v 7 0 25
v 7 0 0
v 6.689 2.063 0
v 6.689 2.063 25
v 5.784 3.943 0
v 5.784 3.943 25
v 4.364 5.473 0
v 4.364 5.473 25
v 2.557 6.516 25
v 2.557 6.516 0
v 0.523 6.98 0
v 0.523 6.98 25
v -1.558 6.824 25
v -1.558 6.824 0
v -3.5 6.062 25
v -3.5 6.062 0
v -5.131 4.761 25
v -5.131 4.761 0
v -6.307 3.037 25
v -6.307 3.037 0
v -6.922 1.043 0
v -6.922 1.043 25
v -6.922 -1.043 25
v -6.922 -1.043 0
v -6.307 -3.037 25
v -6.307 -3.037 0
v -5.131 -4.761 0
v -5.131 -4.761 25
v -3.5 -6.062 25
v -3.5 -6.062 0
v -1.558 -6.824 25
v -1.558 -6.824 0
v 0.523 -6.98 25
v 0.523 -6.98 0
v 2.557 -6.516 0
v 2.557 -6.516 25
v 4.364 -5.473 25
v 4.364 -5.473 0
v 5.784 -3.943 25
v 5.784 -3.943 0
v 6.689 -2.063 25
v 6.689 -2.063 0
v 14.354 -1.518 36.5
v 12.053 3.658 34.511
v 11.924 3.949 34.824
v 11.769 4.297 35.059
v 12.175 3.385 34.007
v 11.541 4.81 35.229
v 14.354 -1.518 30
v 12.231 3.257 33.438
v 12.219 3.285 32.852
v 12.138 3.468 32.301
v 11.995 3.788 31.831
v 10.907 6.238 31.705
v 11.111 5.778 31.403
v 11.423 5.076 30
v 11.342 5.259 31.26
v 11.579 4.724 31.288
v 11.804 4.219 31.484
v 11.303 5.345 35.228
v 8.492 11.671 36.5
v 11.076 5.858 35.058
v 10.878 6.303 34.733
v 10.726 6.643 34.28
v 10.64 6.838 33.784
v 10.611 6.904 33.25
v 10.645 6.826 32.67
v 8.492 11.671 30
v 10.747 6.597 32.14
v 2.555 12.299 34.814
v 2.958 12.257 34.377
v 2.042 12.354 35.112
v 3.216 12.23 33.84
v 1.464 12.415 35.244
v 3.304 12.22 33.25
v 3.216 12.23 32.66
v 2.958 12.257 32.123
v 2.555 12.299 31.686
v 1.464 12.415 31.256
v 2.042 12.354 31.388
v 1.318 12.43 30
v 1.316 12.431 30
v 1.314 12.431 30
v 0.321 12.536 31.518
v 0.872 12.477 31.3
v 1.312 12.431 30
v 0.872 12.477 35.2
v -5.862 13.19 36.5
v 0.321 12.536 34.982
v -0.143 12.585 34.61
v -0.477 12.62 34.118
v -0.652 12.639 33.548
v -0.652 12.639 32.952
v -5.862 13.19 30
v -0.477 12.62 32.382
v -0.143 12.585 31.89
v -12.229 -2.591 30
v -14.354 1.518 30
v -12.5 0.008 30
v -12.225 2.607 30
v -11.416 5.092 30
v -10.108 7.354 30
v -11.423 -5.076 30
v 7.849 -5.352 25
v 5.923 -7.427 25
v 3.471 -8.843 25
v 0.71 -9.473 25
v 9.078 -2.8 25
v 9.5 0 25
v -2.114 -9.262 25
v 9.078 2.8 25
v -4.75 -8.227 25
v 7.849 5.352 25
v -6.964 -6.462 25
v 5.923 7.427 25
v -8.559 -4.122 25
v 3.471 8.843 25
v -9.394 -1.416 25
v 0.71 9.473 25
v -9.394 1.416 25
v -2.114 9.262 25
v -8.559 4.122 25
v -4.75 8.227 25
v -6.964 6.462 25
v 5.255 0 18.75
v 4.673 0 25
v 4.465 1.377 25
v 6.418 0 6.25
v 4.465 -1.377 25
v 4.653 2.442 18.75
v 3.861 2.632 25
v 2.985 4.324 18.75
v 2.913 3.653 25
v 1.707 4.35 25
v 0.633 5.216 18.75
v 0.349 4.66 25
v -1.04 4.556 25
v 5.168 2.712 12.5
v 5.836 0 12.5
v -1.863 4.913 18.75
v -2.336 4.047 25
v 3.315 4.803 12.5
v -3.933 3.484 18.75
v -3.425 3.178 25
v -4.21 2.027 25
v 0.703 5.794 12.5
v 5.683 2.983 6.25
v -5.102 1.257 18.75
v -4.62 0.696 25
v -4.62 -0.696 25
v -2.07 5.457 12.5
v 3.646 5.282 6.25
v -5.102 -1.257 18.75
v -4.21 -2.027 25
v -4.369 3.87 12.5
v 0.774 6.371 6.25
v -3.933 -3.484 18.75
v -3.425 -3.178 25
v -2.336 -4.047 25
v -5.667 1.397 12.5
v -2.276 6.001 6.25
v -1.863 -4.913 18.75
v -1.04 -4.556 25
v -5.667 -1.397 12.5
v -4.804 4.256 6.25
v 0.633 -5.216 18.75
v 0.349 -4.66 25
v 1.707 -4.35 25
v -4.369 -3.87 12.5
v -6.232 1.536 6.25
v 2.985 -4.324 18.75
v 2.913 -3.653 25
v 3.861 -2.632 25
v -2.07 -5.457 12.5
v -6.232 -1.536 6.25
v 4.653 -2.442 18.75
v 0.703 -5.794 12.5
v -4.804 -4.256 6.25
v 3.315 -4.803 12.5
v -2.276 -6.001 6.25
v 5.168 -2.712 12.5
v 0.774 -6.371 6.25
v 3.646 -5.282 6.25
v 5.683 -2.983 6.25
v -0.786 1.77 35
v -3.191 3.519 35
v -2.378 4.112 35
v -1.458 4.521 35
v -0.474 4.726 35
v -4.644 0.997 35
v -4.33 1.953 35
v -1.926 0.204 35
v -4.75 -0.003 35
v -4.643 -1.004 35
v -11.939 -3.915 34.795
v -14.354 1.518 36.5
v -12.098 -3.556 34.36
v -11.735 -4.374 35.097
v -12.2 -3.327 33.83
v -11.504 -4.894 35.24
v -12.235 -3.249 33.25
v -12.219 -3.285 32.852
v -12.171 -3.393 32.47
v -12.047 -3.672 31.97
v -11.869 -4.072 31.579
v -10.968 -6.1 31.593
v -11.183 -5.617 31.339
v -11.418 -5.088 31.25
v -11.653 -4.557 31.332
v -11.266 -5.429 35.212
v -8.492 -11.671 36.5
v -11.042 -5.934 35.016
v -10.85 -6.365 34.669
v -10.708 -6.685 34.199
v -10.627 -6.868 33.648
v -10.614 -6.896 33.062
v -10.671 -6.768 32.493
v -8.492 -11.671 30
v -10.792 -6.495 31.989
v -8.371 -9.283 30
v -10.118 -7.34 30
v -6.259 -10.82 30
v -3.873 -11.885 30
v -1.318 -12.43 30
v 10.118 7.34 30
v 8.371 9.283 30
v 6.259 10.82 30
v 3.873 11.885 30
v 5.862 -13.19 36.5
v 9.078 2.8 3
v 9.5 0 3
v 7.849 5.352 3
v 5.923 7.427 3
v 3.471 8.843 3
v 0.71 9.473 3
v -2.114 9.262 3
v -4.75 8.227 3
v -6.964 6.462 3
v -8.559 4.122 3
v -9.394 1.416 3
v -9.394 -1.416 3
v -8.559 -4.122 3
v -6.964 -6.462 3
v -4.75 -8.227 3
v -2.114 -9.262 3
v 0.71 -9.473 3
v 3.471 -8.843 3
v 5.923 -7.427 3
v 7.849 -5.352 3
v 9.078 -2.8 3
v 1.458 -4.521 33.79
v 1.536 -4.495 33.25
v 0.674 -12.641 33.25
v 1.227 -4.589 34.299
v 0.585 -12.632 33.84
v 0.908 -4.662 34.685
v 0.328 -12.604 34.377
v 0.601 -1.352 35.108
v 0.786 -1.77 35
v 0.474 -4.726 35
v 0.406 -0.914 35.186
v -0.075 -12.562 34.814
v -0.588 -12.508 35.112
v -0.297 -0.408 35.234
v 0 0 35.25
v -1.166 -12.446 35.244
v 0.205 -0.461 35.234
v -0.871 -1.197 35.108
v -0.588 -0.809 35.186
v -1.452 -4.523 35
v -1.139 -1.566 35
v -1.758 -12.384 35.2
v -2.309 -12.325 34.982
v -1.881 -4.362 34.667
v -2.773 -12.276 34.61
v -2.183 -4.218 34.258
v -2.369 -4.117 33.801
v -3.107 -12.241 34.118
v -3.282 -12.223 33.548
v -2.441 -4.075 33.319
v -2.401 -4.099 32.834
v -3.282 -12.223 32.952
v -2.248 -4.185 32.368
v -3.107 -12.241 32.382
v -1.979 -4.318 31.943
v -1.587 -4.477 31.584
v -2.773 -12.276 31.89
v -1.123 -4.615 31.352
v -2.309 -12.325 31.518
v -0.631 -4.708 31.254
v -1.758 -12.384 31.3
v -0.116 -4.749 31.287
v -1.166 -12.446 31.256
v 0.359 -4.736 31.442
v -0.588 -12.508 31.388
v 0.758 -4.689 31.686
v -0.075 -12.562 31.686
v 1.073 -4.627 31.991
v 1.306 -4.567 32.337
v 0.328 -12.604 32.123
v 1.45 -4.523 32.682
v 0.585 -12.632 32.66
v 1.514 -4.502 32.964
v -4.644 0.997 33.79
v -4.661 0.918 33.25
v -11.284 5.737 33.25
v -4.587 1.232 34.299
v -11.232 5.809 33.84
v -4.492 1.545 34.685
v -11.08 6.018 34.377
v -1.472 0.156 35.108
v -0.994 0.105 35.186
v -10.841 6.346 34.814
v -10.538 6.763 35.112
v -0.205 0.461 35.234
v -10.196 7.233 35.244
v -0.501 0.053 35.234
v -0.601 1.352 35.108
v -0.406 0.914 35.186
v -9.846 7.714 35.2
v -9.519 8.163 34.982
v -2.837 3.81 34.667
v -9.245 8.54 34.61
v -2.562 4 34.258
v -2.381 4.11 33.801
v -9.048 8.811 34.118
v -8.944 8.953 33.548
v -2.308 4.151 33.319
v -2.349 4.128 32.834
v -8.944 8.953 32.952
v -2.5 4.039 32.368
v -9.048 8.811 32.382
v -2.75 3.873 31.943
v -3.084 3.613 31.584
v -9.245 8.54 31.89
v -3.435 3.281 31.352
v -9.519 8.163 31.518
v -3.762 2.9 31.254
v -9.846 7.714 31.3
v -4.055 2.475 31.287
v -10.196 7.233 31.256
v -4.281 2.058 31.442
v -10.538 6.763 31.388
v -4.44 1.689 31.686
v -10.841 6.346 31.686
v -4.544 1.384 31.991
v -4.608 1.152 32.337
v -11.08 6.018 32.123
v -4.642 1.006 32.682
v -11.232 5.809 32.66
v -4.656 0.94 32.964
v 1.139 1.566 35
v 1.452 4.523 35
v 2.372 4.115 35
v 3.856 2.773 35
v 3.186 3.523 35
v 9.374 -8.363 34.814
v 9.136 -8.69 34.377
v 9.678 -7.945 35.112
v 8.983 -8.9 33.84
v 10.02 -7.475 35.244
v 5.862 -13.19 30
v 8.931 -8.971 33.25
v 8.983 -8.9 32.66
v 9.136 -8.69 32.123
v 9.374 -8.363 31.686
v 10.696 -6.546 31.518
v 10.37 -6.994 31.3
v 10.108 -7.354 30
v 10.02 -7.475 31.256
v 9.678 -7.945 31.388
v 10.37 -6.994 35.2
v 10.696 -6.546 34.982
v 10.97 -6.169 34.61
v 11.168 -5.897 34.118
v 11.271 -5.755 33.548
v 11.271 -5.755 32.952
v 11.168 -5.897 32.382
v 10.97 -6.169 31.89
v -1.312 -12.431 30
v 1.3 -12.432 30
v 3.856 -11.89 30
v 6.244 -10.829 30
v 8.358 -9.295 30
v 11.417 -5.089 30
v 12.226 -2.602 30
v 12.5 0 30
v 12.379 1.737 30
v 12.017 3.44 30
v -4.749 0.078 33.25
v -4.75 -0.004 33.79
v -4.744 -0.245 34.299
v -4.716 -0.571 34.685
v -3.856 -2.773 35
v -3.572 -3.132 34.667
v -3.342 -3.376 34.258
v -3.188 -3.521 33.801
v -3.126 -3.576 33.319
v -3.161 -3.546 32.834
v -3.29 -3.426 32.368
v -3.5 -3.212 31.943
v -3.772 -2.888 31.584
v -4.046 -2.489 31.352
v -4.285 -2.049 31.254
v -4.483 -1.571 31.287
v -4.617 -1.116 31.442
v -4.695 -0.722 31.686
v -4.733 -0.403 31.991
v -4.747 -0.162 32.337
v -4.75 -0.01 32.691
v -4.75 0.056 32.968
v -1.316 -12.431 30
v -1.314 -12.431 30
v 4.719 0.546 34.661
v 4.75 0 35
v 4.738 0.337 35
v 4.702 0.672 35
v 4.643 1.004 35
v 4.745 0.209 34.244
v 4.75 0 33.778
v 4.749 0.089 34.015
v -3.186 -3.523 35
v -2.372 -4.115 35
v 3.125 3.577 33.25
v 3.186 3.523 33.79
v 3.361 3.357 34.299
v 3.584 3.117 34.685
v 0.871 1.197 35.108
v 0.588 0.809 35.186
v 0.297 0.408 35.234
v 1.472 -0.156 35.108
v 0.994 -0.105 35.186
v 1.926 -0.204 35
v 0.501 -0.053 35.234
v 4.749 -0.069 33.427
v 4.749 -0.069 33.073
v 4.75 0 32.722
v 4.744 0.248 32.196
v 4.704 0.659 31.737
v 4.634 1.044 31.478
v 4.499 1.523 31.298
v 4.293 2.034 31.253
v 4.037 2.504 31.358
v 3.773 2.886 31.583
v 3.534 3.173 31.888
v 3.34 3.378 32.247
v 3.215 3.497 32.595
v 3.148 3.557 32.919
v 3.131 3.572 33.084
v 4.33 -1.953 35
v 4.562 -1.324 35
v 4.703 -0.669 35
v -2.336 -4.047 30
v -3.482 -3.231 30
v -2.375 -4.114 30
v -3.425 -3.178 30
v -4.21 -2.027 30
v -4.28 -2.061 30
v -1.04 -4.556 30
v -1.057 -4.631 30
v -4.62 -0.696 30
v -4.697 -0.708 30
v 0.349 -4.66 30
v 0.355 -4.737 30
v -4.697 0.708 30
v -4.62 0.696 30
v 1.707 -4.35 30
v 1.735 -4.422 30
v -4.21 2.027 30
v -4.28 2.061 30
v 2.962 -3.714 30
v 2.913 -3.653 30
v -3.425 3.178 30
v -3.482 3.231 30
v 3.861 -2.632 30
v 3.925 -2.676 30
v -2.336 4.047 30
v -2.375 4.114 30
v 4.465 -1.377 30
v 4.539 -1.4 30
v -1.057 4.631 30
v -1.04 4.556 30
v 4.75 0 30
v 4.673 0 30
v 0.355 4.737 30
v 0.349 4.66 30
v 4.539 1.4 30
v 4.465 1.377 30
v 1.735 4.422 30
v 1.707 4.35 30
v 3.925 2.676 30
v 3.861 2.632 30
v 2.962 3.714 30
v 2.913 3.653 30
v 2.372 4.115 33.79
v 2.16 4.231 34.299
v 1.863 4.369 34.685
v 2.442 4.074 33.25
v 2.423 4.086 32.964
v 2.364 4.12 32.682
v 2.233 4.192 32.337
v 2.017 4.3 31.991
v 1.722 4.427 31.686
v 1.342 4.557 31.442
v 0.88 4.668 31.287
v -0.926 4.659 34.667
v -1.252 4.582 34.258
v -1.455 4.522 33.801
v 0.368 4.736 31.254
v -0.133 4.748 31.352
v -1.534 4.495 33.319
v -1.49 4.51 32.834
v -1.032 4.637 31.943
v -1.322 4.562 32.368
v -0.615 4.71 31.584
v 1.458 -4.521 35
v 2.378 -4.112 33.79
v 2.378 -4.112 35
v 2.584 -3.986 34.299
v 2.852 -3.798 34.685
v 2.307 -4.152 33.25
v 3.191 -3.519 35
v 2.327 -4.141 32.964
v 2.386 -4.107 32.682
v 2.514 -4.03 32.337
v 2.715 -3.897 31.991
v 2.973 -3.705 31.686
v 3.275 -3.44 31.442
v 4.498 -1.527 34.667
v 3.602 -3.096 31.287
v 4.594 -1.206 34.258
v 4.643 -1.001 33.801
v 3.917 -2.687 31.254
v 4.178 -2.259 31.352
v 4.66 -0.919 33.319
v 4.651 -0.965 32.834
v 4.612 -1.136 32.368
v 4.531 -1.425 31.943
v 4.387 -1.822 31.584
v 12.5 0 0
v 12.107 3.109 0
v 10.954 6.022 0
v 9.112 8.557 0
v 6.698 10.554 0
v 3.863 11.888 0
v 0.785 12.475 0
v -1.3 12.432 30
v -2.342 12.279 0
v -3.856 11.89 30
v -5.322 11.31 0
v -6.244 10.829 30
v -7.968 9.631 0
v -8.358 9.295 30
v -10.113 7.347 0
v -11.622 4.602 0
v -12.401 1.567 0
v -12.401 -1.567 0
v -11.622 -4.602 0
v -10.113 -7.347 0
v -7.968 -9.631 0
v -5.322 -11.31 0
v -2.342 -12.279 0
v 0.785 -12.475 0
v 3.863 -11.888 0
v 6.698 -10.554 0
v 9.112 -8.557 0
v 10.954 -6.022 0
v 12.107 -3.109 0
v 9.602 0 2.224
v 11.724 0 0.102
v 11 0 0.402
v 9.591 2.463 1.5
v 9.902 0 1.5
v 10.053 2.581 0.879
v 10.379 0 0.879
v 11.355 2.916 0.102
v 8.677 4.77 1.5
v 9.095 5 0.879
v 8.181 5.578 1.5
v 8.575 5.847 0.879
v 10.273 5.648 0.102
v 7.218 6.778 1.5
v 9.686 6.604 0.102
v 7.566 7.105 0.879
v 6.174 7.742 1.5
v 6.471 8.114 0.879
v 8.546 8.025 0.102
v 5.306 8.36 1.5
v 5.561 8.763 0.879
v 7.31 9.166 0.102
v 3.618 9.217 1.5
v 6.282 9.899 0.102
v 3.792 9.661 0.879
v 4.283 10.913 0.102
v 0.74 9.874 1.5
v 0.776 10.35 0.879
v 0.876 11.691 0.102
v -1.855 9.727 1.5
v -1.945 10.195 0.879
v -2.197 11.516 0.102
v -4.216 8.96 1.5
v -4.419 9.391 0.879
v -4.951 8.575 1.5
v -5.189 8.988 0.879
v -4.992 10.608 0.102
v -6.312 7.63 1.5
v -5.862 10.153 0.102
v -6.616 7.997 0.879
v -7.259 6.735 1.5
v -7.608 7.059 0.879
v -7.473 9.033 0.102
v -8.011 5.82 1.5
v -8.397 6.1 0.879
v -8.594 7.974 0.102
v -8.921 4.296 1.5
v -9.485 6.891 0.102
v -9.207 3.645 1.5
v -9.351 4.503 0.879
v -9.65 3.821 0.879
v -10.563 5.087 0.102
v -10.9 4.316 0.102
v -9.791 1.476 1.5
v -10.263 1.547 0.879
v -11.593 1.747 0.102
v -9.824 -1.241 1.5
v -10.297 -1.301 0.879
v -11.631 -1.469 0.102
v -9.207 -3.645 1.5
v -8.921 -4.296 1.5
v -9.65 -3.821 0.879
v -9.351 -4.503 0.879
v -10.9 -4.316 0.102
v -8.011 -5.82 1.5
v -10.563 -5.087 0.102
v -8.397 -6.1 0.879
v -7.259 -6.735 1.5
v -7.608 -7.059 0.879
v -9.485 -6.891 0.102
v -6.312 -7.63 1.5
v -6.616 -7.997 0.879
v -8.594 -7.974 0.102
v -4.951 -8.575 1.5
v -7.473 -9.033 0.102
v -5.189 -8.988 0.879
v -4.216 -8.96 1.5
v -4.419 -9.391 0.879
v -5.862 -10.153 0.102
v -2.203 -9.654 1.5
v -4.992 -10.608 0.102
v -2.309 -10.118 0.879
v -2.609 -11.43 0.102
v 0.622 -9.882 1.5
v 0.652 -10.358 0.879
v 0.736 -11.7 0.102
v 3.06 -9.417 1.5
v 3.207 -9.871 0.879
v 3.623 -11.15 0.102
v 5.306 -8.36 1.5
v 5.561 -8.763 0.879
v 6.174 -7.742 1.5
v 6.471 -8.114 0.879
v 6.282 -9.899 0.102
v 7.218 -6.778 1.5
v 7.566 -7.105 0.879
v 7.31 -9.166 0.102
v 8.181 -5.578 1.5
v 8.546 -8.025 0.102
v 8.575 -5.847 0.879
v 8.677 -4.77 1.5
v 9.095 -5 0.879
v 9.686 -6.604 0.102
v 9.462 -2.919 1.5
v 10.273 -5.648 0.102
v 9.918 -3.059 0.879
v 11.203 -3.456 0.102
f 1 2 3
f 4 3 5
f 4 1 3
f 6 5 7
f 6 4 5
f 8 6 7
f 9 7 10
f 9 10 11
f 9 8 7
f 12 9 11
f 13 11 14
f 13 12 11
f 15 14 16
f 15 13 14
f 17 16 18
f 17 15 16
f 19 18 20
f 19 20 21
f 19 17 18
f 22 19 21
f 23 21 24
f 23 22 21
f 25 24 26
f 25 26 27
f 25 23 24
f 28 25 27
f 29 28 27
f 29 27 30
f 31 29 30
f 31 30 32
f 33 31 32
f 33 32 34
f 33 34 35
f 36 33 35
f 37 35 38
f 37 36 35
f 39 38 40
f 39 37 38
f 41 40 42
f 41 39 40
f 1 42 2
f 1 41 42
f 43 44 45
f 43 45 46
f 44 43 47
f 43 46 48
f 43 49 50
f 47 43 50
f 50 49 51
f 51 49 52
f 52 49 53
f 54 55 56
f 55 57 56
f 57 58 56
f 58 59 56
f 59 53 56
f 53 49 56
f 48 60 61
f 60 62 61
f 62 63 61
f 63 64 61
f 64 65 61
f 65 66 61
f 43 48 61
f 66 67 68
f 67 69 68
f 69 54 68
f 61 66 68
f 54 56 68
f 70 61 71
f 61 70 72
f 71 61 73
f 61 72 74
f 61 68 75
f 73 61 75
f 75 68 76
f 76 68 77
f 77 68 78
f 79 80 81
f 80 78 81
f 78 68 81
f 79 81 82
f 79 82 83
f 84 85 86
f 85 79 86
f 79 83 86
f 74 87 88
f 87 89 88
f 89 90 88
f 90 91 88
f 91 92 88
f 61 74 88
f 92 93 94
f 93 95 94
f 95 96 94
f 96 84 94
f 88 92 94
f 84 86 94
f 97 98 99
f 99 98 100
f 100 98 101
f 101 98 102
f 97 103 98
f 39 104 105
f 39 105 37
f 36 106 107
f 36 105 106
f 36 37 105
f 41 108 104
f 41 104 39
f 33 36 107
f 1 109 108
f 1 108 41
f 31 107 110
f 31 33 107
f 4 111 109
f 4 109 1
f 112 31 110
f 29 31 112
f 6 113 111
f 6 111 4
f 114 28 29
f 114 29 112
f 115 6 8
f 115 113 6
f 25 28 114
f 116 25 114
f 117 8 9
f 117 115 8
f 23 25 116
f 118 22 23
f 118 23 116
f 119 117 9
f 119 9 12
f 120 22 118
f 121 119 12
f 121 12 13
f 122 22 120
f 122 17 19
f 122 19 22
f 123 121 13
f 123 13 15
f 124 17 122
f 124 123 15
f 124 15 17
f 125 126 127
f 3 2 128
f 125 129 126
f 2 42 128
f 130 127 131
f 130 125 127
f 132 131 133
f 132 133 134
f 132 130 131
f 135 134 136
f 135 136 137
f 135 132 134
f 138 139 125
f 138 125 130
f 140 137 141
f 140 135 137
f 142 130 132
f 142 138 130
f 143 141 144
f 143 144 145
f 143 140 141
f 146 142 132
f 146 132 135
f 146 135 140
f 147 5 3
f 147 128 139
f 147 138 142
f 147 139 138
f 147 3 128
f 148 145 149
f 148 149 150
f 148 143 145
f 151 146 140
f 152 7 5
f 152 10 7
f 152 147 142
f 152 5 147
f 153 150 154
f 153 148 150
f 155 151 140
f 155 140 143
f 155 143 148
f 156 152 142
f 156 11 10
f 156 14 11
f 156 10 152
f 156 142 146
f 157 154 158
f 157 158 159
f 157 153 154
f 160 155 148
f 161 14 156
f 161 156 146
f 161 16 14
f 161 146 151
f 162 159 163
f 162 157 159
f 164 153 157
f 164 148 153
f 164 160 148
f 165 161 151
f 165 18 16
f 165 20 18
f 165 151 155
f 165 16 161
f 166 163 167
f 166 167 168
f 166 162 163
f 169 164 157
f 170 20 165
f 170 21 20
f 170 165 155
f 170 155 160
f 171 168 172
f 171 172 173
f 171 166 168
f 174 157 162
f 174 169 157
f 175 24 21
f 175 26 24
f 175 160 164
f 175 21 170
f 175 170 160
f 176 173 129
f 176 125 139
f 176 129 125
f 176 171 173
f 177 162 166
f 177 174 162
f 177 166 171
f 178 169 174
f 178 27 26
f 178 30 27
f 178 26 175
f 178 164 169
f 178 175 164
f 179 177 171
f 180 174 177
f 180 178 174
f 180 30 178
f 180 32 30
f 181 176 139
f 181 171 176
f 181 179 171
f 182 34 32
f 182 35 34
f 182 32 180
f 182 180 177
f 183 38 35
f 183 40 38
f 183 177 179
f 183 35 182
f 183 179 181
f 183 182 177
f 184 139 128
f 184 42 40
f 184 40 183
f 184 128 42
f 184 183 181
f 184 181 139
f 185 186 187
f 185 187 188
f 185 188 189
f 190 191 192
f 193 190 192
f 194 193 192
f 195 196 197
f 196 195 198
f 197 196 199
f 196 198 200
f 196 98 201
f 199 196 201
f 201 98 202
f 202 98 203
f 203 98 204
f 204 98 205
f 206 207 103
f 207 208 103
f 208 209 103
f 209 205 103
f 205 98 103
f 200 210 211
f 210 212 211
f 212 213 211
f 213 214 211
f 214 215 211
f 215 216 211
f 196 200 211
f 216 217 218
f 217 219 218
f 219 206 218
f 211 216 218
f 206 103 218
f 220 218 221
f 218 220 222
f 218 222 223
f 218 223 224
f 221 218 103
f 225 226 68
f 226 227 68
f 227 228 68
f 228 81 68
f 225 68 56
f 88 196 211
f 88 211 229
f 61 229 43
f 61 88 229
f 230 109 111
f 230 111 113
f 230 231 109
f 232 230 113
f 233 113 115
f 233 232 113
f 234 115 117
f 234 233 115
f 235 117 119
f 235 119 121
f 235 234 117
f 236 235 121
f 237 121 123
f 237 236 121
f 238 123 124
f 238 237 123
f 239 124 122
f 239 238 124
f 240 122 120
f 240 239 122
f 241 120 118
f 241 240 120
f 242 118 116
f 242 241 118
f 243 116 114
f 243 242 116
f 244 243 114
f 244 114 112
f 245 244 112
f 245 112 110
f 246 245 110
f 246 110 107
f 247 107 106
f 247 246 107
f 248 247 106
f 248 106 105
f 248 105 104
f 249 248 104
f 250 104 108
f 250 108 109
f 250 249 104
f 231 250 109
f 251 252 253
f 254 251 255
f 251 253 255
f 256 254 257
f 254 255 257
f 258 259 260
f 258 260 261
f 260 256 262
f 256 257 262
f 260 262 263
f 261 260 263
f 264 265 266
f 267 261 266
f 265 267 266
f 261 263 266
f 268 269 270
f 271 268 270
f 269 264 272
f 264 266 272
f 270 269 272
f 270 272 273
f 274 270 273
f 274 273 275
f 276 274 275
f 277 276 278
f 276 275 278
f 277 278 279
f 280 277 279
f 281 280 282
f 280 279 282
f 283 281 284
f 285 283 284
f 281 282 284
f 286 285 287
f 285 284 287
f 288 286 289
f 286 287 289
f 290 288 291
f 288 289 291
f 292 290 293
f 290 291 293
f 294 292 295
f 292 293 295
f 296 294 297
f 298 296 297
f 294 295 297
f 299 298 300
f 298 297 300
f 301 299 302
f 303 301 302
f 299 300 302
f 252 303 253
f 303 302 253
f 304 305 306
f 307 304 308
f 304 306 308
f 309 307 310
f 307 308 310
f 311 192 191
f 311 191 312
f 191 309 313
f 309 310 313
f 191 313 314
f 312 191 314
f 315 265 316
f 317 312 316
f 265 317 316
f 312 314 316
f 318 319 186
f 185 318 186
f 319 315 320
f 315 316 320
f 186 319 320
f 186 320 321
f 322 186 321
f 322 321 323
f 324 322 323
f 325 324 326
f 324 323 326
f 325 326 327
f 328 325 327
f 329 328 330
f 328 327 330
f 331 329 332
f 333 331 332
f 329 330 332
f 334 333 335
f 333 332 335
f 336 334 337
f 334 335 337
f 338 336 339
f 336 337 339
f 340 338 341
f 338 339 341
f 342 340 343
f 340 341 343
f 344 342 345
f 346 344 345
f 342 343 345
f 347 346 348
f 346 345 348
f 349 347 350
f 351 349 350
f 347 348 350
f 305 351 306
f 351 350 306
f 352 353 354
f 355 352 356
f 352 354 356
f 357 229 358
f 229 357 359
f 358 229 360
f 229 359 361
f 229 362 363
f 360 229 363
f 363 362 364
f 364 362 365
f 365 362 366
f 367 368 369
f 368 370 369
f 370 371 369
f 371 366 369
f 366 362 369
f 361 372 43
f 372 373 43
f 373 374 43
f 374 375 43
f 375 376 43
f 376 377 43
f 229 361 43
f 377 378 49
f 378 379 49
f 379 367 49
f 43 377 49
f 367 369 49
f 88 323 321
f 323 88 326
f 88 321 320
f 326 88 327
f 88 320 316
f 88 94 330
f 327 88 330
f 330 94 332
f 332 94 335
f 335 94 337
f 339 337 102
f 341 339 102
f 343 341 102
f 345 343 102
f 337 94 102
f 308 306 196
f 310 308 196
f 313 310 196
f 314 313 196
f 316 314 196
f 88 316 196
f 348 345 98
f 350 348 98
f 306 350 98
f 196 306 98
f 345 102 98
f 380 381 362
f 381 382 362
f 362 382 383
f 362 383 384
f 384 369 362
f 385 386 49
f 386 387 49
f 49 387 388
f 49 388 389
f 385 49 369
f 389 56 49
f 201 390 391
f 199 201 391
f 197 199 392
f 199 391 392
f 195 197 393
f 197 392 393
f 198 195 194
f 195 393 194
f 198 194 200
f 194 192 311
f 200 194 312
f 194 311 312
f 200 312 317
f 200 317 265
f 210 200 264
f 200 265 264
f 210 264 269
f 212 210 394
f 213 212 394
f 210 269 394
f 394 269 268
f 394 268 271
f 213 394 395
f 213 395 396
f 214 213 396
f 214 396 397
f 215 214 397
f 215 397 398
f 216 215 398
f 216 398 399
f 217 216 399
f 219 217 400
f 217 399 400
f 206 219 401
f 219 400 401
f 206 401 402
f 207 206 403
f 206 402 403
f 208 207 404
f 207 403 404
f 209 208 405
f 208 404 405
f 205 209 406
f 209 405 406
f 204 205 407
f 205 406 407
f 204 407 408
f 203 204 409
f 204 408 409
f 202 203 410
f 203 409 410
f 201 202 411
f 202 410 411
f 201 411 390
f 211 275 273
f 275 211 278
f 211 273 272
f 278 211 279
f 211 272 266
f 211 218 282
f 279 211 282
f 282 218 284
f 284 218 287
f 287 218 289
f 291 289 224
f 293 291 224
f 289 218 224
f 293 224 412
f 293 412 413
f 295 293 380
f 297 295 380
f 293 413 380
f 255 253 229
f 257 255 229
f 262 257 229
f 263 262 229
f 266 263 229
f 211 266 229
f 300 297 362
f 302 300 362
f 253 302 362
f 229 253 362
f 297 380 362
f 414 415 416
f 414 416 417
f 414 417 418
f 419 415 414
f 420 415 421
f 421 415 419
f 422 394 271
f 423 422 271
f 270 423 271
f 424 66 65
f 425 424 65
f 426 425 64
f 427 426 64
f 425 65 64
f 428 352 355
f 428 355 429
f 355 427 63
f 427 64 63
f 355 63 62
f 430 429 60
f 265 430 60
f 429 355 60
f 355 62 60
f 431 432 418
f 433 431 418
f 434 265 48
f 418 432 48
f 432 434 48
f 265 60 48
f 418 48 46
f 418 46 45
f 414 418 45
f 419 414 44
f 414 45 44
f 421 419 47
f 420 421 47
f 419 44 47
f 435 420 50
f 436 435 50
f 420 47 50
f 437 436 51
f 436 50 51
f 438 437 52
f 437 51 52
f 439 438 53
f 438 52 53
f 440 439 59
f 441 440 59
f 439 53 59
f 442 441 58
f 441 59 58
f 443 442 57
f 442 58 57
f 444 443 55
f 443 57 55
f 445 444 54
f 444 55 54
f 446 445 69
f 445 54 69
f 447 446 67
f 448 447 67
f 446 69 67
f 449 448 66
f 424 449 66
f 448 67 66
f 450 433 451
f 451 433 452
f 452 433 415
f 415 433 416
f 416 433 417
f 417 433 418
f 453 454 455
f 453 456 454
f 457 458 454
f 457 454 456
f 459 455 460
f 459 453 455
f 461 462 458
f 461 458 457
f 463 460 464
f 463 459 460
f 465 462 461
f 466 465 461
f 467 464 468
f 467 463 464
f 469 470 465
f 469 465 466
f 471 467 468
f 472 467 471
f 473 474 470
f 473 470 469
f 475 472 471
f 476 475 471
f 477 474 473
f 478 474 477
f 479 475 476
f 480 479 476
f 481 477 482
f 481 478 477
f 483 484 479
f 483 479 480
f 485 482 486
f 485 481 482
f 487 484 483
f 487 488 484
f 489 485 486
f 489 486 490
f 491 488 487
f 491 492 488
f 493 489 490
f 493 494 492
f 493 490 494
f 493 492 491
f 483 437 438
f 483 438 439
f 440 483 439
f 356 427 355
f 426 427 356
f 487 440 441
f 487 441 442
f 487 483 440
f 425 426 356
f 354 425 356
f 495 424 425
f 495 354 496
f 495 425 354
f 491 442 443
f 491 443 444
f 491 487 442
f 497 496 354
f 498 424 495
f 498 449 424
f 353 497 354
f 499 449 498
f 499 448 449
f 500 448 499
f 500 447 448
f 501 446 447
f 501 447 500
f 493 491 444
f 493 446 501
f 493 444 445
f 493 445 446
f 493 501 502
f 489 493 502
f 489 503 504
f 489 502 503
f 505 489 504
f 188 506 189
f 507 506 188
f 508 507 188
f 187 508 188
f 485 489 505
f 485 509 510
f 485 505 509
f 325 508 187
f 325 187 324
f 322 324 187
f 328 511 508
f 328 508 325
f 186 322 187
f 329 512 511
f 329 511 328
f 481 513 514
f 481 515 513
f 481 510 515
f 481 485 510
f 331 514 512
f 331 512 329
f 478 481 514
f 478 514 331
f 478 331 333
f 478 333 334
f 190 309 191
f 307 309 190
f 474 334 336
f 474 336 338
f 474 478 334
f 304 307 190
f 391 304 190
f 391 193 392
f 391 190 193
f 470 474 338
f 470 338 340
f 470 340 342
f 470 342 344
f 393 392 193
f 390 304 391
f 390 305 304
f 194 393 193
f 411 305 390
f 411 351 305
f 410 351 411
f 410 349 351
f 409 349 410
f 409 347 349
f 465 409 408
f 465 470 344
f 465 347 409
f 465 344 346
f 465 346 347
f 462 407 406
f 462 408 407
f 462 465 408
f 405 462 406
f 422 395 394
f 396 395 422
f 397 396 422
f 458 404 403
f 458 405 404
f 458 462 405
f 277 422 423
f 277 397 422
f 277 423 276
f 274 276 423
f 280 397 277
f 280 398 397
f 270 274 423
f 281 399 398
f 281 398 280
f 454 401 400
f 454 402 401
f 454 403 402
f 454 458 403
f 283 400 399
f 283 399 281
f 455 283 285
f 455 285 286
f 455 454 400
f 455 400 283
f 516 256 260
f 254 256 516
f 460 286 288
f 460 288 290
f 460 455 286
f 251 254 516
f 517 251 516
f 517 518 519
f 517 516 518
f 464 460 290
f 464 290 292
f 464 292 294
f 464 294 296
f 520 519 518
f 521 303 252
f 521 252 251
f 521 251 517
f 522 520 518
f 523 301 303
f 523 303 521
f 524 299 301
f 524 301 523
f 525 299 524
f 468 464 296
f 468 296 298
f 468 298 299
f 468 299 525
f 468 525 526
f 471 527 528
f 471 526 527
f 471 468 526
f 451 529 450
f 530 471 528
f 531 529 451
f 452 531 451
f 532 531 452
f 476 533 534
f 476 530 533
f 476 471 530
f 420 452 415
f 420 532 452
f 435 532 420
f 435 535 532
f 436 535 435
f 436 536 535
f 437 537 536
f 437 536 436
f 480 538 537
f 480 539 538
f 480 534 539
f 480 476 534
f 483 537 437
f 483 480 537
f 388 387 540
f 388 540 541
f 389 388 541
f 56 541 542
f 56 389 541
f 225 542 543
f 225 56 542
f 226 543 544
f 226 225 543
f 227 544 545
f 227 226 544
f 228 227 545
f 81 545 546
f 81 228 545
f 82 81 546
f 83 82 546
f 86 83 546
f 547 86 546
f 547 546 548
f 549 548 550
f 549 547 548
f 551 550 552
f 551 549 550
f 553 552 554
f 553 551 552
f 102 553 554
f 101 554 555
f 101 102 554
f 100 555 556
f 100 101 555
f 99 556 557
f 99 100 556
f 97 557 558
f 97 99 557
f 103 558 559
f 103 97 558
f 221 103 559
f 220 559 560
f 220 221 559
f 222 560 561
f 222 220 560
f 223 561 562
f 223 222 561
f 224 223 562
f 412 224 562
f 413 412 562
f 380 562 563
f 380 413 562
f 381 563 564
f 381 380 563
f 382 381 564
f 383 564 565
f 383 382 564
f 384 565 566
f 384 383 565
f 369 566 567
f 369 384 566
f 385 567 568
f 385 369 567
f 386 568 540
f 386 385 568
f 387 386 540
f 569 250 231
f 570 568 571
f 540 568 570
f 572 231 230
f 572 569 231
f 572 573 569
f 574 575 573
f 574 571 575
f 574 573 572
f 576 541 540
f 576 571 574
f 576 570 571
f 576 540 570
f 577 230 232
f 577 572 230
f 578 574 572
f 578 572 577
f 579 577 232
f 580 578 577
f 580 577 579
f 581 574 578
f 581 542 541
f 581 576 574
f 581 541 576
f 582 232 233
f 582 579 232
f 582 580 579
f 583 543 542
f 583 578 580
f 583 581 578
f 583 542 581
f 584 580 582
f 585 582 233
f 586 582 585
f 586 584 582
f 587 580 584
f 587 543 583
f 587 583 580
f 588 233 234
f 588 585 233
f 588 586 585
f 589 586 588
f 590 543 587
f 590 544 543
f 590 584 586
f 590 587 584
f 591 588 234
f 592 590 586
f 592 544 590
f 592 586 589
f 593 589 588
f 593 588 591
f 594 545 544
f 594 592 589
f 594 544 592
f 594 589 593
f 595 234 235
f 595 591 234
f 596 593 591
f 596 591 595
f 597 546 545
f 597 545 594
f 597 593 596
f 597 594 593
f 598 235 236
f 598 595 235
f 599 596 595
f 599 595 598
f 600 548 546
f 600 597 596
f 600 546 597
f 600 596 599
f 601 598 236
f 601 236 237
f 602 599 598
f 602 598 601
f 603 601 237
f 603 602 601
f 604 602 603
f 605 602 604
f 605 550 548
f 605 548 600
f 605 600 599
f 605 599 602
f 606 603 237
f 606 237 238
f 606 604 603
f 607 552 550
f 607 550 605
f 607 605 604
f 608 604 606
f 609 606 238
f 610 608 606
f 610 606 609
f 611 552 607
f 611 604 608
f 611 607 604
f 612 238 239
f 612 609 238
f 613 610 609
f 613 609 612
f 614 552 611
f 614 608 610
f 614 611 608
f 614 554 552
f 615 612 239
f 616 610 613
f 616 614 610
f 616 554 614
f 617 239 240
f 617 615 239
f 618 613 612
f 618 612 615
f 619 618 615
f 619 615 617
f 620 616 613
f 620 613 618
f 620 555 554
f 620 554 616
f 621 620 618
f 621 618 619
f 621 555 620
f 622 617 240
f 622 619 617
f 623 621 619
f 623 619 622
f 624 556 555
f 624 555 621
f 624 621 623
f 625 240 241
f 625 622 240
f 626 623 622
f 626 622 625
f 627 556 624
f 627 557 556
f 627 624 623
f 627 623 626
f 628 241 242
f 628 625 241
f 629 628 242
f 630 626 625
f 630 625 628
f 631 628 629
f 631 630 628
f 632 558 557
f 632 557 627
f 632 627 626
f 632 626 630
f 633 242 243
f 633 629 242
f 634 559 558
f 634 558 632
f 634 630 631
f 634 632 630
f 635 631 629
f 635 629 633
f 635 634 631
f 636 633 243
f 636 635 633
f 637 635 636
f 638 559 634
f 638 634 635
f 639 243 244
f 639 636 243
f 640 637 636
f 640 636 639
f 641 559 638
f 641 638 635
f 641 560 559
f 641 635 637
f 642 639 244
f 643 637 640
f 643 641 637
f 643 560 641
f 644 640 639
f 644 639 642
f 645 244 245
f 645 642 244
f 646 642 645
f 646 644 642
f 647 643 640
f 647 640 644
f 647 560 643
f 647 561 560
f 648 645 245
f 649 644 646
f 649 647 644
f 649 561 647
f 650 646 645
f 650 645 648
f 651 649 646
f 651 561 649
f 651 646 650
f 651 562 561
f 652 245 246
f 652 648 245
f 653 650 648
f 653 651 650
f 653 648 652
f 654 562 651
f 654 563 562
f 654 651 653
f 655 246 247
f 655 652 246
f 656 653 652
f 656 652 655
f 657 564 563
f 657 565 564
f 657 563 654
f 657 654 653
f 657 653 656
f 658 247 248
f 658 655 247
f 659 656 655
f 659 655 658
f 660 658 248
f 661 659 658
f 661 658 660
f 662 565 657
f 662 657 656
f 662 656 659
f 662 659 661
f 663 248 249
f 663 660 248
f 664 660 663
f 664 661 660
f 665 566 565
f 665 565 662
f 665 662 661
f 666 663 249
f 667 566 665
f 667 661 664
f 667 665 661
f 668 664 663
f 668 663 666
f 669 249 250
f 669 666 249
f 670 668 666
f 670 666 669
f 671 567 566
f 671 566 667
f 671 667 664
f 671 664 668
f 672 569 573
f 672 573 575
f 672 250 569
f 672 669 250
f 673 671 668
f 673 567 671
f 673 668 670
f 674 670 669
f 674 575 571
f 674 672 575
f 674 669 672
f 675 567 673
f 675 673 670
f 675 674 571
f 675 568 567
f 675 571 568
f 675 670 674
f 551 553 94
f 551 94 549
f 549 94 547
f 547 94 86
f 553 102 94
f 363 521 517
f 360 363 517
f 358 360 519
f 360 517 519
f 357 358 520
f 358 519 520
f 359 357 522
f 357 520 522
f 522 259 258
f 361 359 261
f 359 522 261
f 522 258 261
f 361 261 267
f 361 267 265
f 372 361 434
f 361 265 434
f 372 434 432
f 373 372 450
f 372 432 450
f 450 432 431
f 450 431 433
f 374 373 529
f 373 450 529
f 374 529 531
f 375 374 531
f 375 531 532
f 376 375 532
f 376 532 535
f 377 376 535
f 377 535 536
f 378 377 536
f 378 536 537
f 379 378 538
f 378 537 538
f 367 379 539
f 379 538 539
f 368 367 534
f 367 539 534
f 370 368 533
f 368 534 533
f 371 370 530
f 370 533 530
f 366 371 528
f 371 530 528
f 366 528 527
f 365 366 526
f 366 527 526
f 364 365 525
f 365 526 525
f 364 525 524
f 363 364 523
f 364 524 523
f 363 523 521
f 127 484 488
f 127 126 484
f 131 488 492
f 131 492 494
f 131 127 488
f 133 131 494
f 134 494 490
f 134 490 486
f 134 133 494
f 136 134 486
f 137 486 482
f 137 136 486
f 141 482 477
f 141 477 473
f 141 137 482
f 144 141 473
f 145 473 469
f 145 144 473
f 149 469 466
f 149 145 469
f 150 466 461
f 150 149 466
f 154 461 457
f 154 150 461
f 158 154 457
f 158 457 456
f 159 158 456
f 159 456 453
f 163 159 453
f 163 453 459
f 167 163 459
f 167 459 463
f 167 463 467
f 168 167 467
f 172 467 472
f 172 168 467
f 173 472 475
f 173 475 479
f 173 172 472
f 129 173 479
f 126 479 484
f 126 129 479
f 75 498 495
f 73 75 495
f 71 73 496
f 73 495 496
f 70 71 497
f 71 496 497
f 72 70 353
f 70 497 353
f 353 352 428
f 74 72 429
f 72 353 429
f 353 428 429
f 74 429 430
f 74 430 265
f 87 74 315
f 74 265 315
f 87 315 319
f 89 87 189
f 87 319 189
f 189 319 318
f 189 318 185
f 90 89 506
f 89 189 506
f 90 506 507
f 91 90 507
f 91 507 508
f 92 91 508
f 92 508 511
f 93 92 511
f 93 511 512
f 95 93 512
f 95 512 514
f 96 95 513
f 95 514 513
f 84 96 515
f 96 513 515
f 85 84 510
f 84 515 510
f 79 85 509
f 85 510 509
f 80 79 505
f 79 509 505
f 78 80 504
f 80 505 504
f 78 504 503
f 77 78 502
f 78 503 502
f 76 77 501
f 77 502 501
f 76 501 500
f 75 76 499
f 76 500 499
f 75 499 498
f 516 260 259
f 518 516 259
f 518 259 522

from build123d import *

# Parameters (mm, degrees)
F2_R      = 4.75
F3_DEPTH  = 5
F5_DEPTH  = 1.5
F6_R      = 2
F7_DEPTH  = 30
F8_R      = 2
F9_DEPTH  = 30
F10_R     = 2
F11_DEPTH = 30


with BuildPart() as f1:
    # F0 (on Front) → F1 (revolve)
    with BuildSketch(Plane.XZ):
        with BuildLine():
            Line((9.5, 25), (9.5, 3))
            ThreePointArc((9.5, 3), (10.37868, 0.87868), (12.5, 0))
            Line((12.5, 0), (12.5, 25))
            Line((12.5, 25), (12.5, 30))
            Line((12.5, 30), (4.672674, 30))
            Line((4.672674, 30), (4.672674, 25))
            Line((4.672674, 25), (7, 0))
            Line((7, 0), (7, 25))
            Line((7, 25), (9.5, 25))
        make_face()
    revolve(axis=Axis((0, 0, 27.631196), (0, 0, 1)))

    # F2 (on face) → F3 (join)
    with BuildSketch(Plane.XY.offset(30)):
        Polygon((-8.491879, -11.671389), (5.86178, -13.189877), (14.353659, -1.518488), (8.491879, 11.671389), (-5.86178, 13.189877), (-14.353659, 1.518488), align=None)
        Circle(F2_R, mode=Mode.SUBTRACT)
    extrude(amount=F3_DEPTH)

    # F4 (on face) → F5 (join)
    with BuildSketch(Plane.XY.offset(35)):
        Polygon((-5.86178, 13.189877), (-14.353659, 1.518488), (-8.491879, -11.671389), (5.86178, -13.189877), (14.353659, -1.518488), (8.491879, 11.671389), align=None)
    extrude(amount=F5_DEPTH)

    # F6 (on face) → F7 (cut)
    with BuildSketch(Plane(origin=(-1.315049, -12.430633, 0), x_dir=(0.994451, -0.105204, 0), z_dir=(-0.105204, -0.994451, 0))):
        with Locations((0, 33.25)):
            Circle(F6_R)
    extrude(amount=-F7_DEPTH, mode=Mode.SUBTRACT)

    # F8 (on face) → F9 (cut)
    with BuildSketch(Plane(origin=(-10.10772, 7.354183, 0), x_dir=(-0.588335, -0.808618, 0), z_dir=(-0.808618, 0.588335, 0))):
        with Locations((0, 33.25)):
            Circle(F8_R)
    extrude(amount=-F9_DEPTH, mode=Mode.SUBTRACT)

    # F10 (on face) → F11 (cut)
    with BuildSketch(Plane(origin=(11.422769, 5.076451, 0), x_dir=(-0.406116, 0.913822, 0), z_dir=(0.913822, 0.406116, 0))):
        with Locations((0, 33.25)):
            Circle(F10_R)
    extrude(amount=-F11_DEPTH, mode=Mode.SUBTRACT)


solid = f1.part
